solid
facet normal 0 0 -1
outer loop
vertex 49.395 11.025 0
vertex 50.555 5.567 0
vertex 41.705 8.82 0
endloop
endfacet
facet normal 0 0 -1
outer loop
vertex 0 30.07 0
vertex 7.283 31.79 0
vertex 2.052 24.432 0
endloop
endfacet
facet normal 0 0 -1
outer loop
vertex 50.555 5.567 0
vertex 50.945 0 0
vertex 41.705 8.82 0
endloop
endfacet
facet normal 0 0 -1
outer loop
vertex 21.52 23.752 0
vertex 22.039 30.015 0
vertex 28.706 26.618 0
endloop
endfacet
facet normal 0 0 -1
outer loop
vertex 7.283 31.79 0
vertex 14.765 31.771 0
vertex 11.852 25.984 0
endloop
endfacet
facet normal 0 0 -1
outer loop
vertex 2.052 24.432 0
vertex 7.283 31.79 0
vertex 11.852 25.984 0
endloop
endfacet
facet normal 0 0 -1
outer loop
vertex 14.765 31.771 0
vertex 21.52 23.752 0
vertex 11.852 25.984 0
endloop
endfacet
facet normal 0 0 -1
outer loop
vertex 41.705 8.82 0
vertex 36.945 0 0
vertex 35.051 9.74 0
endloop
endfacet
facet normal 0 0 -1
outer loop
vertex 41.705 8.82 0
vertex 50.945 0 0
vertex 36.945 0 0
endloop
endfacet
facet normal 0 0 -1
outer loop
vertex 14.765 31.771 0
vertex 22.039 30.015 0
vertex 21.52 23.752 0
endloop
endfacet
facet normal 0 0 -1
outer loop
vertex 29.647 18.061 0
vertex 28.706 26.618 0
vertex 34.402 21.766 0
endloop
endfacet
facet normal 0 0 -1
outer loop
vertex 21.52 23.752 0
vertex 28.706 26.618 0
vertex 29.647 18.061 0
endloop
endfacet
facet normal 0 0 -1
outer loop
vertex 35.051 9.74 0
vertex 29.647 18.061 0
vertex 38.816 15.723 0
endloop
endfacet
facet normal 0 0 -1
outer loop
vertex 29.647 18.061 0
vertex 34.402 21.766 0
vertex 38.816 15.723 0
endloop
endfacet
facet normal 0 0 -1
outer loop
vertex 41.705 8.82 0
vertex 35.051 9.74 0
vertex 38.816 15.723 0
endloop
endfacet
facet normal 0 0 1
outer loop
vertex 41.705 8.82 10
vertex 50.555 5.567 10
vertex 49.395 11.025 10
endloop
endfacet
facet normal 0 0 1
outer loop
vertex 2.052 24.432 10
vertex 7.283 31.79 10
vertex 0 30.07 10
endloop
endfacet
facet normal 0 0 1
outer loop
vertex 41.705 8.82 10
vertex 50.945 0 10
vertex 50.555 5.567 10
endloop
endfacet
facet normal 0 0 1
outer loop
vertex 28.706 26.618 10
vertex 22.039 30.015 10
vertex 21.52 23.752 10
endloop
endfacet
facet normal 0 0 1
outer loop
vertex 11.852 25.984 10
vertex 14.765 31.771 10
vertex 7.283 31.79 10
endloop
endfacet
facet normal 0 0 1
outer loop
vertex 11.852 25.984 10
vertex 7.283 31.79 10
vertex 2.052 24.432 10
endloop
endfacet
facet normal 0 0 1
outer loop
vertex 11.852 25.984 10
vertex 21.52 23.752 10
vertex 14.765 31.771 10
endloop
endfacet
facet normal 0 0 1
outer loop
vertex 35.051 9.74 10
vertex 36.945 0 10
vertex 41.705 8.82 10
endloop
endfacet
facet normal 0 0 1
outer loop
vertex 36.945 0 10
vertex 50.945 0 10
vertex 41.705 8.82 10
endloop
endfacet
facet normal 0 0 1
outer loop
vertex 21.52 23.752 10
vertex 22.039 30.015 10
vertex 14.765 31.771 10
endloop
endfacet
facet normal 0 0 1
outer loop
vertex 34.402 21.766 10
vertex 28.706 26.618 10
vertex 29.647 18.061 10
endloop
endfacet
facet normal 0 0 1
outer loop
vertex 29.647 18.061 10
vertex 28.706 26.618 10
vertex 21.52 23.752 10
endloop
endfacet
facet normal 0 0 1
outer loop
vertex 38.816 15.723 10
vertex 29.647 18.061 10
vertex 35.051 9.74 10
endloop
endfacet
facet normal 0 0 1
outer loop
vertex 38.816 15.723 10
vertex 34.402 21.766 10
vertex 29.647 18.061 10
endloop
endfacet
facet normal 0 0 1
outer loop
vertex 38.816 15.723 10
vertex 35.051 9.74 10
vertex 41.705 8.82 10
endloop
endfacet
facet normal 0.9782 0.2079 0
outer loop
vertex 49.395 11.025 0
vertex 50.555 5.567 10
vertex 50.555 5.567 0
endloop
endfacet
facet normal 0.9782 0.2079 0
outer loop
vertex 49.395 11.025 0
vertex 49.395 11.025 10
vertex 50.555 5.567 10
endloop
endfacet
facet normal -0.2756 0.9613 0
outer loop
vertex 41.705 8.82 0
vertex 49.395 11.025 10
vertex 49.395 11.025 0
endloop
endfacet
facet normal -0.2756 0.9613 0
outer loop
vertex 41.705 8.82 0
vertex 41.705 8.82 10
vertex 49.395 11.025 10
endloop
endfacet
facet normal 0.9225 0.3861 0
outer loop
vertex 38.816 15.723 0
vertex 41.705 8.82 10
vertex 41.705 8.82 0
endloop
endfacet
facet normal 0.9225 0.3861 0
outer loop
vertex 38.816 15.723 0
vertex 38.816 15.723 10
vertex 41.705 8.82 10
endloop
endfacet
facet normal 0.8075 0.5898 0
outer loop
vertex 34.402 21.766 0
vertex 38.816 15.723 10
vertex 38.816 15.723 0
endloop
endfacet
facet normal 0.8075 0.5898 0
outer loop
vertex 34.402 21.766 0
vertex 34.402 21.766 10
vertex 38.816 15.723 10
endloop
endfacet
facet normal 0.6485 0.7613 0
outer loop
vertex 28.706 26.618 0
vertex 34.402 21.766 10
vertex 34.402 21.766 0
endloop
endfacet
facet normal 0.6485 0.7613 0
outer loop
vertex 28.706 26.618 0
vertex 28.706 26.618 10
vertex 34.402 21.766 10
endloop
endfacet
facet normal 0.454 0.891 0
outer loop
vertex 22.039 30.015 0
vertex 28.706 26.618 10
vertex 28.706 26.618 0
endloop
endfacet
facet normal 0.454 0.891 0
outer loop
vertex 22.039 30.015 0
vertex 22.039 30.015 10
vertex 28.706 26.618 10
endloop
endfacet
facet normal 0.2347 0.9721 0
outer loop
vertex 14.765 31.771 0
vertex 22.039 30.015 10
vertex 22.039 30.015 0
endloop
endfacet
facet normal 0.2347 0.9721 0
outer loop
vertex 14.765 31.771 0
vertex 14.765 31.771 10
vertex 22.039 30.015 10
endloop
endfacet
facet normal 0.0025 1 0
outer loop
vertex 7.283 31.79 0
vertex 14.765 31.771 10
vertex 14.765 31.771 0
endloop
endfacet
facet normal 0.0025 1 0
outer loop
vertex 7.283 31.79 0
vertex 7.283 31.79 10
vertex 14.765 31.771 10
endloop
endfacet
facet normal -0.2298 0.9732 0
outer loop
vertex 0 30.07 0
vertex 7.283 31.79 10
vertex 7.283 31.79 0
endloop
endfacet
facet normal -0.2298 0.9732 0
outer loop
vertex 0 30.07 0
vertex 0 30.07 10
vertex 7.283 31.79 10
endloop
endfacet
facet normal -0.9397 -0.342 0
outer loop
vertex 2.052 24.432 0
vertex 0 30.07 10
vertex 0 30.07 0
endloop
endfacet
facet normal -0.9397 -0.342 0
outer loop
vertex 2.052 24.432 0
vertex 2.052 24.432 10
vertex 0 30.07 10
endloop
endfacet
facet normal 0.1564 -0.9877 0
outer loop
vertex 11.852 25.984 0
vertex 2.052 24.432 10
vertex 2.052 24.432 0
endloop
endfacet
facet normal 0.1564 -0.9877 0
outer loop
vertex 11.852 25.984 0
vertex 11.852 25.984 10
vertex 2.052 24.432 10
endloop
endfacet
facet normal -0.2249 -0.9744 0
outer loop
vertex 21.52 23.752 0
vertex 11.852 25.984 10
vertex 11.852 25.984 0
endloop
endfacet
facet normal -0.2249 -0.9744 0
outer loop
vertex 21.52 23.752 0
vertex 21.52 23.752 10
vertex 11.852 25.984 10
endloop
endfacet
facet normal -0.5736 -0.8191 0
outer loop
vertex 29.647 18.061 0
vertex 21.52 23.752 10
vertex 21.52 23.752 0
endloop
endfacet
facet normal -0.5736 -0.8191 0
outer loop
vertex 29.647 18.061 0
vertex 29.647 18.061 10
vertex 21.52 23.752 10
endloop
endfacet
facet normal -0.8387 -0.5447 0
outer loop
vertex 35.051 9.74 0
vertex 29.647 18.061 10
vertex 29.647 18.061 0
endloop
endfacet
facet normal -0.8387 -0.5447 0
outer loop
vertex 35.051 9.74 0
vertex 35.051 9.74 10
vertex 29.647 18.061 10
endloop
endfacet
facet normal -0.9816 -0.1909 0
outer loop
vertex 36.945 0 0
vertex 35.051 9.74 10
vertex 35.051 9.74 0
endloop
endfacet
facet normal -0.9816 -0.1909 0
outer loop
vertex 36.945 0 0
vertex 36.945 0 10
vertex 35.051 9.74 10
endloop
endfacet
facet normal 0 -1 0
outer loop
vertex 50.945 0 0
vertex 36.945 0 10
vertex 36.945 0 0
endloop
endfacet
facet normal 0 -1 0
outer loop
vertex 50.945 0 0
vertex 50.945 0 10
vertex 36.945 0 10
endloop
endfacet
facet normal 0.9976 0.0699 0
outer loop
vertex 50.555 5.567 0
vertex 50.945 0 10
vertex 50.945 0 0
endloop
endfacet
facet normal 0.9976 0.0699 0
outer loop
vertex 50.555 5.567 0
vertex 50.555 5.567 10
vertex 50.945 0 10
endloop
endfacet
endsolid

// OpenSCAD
$fn = 32;

// ----------------------------------------------------------------------
// Arc stop: segment, 10 mm thick
// ----------------------------------------------------------------------

// --- parameters (mm) ---
profile_height = 10;      // extrusion height
profile_points = 17;      // points of the closed outline

profile = [[50.945, 0], [50.555, 5.567], [49.395, 11.025], [41.705, 8.82], [38.816, 15.723], [34.402, 21.766], [28.706, 26.618], [22.039, 30.015], [14.765, 31.771], [7.283, 31.79], [0, 30.07], [2.052, 24.432], [11.852, 25.984], [21.52, 23.752], [29.647, 18.061], [35.051, 9.74], [36.945, 0]];  // single closed polygon, 17 points, counter clockwise

// --- the one profile operation ---
linear_extrude(height = profile_height) polygon(points = profile);
